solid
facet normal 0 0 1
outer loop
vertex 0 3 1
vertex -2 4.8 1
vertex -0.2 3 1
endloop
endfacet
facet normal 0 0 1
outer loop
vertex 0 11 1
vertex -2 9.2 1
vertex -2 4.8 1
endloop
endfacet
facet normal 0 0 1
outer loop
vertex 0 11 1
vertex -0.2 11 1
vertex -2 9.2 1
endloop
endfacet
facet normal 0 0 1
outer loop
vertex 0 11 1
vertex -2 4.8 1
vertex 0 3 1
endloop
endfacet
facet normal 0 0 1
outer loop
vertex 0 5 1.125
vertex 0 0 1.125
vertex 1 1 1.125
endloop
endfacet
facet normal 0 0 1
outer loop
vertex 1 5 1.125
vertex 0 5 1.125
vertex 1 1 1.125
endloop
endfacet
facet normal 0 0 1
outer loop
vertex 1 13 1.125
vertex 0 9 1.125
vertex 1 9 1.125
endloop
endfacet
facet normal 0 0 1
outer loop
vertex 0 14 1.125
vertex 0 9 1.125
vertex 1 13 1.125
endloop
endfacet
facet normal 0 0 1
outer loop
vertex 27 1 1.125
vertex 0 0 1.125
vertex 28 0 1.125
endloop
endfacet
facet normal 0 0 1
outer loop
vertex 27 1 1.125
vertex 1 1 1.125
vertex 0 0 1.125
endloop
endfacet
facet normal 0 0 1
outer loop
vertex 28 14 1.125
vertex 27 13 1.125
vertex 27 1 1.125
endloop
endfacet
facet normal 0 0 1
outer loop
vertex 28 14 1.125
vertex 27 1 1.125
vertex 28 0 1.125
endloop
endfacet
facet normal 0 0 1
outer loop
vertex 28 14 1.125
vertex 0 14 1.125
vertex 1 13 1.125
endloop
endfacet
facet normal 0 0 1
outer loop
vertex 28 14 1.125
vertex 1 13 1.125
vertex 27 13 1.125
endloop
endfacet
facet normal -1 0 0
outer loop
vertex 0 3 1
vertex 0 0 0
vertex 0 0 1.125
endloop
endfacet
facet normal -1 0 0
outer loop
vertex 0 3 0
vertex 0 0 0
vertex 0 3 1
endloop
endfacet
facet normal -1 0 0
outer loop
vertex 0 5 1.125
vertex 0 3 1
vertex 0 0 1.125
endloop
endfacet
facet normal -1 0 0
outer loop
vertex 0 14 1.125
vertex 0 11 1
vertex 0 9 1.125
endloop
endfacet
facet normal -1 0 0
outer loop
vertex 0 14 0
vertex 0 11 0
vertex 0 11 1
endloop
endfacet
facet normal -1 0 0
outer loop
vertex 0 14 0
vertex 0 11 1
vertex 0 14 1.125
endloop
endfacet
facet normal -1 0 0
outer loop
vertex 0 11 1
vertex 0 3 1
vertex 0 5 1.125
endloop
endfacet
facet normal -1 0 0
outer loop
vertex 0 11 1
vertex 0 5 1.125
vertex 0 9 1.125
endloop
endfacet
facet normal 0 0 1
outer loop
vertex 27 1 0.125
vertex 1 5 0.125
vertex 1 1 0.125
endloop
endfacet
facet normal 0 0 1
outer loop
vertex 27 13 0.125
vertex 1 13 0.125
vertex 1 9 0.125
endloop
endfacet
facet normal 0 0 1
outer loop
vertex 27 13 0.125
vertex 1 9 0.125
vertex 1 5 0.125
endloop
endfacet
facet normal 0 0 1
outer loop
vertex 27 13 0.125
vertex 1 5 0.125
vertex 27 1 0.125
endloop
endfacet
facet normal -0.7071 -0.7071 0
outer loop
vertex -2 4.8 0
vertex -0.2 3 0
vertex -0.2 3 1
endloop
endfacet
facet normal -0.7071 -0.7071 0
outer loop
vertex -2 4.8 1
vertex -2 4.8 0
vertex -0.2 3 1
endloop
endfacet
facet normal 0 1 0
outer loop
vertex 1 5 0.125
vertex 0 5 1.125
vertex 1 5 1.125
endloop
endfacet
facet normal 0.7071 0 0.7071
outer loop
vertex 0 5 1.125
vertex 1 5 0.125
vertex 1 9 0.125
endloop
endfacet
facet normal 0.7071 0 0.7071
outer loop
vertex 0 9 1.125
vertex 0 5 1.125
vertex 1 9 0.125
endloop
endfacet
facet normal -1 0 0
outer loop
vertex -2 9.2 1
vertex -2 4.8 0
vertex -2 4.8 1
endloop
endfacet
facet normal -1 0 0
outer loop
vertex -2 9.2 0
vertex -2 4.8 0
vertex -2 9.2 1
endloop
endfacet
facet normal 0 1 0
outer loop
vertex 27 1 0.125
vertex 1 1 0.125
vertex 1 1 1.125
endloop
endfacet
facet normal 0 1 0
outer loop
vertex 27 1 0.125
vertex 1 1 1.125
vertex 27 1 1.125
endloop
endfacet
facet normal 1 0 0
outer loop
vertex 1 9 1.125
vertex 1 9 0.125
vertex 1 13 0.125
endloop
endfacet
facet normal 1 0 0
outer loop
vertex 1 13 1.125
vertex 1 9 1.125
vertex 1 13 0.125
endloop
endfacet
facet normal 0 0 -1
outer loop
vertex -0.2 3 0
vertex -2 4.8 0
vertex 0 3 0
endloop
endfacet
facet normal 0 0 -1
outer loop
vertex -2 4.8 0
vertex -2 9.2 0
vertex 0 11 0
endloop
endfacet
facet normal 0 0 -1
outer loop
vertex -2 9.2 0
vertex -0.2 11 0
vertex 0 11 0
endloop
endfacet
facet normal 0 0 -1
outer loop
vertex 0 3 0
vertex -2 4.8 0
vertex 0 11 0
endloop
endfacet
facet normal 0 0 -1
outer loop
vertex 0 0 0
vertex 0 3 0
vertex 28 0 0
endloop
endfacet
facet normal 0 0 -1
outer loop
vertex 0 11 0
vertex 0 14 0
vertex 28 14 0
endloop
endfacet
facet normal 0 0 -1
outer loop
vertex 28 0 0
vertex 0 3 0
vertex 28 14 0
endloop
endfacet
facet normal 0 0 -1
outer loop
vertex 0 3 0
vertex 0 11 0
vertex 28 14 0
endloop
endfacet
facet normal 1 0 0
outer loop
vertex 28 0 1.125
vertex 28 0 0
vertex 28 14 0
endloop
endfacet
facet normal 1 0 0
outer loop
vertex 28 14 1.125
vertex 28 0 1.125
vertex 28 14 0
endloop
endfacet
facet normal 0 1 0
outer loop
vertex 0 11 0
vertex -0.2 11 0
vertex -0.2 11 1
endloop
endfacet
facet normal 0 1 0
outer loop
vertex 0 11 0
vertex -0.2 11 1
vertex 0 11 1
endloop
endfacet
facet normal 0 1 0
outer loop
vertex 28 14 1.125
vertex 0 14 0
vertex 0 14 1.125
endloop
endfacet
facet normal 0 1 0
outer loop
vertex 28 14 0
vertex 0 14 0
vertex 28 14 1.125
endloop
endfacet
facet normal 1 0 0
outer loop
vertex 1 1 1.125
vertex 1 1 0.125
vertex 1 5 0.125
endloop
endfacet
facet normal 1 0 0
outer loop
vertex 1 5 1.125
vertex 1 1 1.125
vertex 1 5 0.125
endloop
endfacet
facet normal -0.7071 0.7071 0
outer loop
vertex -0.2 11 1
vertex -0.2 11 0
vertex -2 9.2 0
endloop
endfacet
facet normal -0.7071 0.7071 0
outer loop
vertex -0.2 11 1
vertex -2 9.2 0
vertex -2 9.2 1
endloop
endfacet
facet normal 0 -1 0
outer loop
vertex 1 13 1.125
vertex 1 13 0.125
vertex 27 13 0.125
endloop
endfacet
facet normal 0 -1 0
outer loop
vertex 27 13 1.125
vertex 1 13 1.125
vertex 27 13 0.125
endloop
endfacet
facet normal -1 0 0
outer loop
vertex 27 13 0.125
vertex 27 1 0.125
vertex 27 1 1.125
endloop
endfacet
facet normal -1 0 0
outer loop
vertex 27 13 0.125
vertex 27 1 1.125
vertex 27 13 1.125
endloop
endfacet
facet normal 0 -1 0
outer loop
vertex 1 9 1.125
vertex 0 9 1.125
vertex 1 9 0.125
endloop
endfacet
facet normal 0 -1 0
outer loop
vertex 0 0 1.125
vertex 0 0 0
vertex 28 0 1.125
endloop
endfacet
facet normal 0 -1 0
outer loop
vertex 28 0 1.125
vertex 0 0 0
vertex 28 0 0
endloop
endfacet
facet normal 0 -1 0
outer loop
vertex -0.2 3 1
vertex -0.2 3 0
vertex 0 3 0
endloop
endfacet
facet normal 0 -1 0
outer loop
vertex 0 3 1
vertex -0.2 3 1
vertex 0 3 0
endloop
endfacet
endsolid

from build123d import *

# Parameters (mm, degrees)
BOX001_W        = 3
BOX001_H        = 4
BOX001_DEPTH    = 5
CHAMFER_SIZE    = 2
BOX002_W        = 2
BOX002_H        = 8
BOX002_DEPTH    = 1
CHAMFER001_SIZE = 1.8
SKETCH004_W     = 1
SKETCH004_H     = 14
PAD004_DEPTH    = 1
SKETCH005_W     = 28
SKETCH005_H     = 1
PAD005_DEPTH    = 1
SKETCH006_W     = 1
SKETCH006_H     = 14
PAD006_DEPTH    = 1
SKETCH003_W     = 28
SKETCH003_H     = 1
PAD003_DEPTH    = 1
BOX_W           = 28
BOX_H           = 14
BOX_DEPTH       = 0.125


with BuildPart() as chamfer_body:
    # Box001 → Box001 (new body)
    with BuildSketch(Plane(origin=(-1, 5, 0.125), x_dir=(1, 0, 0), z_dir=(0, 0, 1))):
        with Locations((1.5, 2)):
            Rectangle(BOX001_W, BOX001_H)
    extrude(amount=BOX001_DEPTH)

    # Chamfer
    chamfer_edges = [chamfer_body.edges().sort_by_distance(p)[0] for p in [
        (-1, 7, 0.125),
    ]]
    chamfer(chamfer_edges, length=CHAMFER_SIZE)


with BuildPart() as chamfer001:
    # Box002 → Box002 (new body)
    with BuildSketch(Plane(origin=(-2, 3, 0), x_dir=(1, 0, 0), z_dir=(0, 0, 1))):
        with Locations((1, 4)):
            Rectangle(BOX002_W, BOX002_H)
    extrude(amount=BOX002_DEPTH)

    # Chamfer001
    chamfer001_edges = [chamfer001.edges().sort_by_distance(p)[0] for p in [
        (-2, 3, 0.5),
        (-2, 11, 0.5),
    ]]
    chamfer(chamfer001_edges, length=CHAMFER001_SIZE)


with BuildPart() as pad004:
    # Sketch004 → Pad004 (new body)
    with BuildSketch(Plane.XY.offset(0.125)):
        with Locations((0.5, 7)):
            Rectangle(SKETCH004_W, SKETCH004_H)
    extrude(amount=PAD004_DEPTH)


with BuildPart() as pad005:
    # Sketch005 → Pad005 (new body)
    with BuildSketch(Plane.XY.offset(0.125)):
        with Locations((14, 0.5)):
            Rectangle(SKETCH005_W, SKETCH005_H)
    extrude(amount=PAD005_DEPTH)


with BuildPart() as pad006:
    # Sketch006 → Pad006 (new body)
    with BuildSketch(Plane.XY.offset(0.125)):
        with Locations((27.5, 7)):
            Rectangle(SKETCH006_W, SKETCH006_H)
    extrude(amount=PAD006_DEPTH)


with BuildPart() as walls:
    # Sketch003 → Pad003 (new body)
    with BuildSketch(Plane.XY.offset(0.125)):
        with Locations((14, 13.5)):
            Rectangle(SKETCH003_W, SKETCH003_H)
    extrude(amount=PAD003_DEPTH)

    # Fusion001: union Pad004, Pad005, Pad006
    add(pad004.part)
    add(pad005.part)
    add(pad006.part)

    # Fusion: union Chamfer001
    add(chamfer001.part)

    # Cut: cut Chamfer body
    add(chamfer_body.part, mode=Mode.SUBTRACT)


with BuildPart() as base_and_walls_do_not_edit:
    # Box → Box (new body)
    with BuildSketch(Plane.XY):
        with Locations((14, 7)):
            Rectangle(BOX_W, BOX_H)
    extrude(amount=BOX_DEPTH)

    # Fusion024: union Walls
    add(walls.part)


solid = base_and_walls_do_not_edit.part
